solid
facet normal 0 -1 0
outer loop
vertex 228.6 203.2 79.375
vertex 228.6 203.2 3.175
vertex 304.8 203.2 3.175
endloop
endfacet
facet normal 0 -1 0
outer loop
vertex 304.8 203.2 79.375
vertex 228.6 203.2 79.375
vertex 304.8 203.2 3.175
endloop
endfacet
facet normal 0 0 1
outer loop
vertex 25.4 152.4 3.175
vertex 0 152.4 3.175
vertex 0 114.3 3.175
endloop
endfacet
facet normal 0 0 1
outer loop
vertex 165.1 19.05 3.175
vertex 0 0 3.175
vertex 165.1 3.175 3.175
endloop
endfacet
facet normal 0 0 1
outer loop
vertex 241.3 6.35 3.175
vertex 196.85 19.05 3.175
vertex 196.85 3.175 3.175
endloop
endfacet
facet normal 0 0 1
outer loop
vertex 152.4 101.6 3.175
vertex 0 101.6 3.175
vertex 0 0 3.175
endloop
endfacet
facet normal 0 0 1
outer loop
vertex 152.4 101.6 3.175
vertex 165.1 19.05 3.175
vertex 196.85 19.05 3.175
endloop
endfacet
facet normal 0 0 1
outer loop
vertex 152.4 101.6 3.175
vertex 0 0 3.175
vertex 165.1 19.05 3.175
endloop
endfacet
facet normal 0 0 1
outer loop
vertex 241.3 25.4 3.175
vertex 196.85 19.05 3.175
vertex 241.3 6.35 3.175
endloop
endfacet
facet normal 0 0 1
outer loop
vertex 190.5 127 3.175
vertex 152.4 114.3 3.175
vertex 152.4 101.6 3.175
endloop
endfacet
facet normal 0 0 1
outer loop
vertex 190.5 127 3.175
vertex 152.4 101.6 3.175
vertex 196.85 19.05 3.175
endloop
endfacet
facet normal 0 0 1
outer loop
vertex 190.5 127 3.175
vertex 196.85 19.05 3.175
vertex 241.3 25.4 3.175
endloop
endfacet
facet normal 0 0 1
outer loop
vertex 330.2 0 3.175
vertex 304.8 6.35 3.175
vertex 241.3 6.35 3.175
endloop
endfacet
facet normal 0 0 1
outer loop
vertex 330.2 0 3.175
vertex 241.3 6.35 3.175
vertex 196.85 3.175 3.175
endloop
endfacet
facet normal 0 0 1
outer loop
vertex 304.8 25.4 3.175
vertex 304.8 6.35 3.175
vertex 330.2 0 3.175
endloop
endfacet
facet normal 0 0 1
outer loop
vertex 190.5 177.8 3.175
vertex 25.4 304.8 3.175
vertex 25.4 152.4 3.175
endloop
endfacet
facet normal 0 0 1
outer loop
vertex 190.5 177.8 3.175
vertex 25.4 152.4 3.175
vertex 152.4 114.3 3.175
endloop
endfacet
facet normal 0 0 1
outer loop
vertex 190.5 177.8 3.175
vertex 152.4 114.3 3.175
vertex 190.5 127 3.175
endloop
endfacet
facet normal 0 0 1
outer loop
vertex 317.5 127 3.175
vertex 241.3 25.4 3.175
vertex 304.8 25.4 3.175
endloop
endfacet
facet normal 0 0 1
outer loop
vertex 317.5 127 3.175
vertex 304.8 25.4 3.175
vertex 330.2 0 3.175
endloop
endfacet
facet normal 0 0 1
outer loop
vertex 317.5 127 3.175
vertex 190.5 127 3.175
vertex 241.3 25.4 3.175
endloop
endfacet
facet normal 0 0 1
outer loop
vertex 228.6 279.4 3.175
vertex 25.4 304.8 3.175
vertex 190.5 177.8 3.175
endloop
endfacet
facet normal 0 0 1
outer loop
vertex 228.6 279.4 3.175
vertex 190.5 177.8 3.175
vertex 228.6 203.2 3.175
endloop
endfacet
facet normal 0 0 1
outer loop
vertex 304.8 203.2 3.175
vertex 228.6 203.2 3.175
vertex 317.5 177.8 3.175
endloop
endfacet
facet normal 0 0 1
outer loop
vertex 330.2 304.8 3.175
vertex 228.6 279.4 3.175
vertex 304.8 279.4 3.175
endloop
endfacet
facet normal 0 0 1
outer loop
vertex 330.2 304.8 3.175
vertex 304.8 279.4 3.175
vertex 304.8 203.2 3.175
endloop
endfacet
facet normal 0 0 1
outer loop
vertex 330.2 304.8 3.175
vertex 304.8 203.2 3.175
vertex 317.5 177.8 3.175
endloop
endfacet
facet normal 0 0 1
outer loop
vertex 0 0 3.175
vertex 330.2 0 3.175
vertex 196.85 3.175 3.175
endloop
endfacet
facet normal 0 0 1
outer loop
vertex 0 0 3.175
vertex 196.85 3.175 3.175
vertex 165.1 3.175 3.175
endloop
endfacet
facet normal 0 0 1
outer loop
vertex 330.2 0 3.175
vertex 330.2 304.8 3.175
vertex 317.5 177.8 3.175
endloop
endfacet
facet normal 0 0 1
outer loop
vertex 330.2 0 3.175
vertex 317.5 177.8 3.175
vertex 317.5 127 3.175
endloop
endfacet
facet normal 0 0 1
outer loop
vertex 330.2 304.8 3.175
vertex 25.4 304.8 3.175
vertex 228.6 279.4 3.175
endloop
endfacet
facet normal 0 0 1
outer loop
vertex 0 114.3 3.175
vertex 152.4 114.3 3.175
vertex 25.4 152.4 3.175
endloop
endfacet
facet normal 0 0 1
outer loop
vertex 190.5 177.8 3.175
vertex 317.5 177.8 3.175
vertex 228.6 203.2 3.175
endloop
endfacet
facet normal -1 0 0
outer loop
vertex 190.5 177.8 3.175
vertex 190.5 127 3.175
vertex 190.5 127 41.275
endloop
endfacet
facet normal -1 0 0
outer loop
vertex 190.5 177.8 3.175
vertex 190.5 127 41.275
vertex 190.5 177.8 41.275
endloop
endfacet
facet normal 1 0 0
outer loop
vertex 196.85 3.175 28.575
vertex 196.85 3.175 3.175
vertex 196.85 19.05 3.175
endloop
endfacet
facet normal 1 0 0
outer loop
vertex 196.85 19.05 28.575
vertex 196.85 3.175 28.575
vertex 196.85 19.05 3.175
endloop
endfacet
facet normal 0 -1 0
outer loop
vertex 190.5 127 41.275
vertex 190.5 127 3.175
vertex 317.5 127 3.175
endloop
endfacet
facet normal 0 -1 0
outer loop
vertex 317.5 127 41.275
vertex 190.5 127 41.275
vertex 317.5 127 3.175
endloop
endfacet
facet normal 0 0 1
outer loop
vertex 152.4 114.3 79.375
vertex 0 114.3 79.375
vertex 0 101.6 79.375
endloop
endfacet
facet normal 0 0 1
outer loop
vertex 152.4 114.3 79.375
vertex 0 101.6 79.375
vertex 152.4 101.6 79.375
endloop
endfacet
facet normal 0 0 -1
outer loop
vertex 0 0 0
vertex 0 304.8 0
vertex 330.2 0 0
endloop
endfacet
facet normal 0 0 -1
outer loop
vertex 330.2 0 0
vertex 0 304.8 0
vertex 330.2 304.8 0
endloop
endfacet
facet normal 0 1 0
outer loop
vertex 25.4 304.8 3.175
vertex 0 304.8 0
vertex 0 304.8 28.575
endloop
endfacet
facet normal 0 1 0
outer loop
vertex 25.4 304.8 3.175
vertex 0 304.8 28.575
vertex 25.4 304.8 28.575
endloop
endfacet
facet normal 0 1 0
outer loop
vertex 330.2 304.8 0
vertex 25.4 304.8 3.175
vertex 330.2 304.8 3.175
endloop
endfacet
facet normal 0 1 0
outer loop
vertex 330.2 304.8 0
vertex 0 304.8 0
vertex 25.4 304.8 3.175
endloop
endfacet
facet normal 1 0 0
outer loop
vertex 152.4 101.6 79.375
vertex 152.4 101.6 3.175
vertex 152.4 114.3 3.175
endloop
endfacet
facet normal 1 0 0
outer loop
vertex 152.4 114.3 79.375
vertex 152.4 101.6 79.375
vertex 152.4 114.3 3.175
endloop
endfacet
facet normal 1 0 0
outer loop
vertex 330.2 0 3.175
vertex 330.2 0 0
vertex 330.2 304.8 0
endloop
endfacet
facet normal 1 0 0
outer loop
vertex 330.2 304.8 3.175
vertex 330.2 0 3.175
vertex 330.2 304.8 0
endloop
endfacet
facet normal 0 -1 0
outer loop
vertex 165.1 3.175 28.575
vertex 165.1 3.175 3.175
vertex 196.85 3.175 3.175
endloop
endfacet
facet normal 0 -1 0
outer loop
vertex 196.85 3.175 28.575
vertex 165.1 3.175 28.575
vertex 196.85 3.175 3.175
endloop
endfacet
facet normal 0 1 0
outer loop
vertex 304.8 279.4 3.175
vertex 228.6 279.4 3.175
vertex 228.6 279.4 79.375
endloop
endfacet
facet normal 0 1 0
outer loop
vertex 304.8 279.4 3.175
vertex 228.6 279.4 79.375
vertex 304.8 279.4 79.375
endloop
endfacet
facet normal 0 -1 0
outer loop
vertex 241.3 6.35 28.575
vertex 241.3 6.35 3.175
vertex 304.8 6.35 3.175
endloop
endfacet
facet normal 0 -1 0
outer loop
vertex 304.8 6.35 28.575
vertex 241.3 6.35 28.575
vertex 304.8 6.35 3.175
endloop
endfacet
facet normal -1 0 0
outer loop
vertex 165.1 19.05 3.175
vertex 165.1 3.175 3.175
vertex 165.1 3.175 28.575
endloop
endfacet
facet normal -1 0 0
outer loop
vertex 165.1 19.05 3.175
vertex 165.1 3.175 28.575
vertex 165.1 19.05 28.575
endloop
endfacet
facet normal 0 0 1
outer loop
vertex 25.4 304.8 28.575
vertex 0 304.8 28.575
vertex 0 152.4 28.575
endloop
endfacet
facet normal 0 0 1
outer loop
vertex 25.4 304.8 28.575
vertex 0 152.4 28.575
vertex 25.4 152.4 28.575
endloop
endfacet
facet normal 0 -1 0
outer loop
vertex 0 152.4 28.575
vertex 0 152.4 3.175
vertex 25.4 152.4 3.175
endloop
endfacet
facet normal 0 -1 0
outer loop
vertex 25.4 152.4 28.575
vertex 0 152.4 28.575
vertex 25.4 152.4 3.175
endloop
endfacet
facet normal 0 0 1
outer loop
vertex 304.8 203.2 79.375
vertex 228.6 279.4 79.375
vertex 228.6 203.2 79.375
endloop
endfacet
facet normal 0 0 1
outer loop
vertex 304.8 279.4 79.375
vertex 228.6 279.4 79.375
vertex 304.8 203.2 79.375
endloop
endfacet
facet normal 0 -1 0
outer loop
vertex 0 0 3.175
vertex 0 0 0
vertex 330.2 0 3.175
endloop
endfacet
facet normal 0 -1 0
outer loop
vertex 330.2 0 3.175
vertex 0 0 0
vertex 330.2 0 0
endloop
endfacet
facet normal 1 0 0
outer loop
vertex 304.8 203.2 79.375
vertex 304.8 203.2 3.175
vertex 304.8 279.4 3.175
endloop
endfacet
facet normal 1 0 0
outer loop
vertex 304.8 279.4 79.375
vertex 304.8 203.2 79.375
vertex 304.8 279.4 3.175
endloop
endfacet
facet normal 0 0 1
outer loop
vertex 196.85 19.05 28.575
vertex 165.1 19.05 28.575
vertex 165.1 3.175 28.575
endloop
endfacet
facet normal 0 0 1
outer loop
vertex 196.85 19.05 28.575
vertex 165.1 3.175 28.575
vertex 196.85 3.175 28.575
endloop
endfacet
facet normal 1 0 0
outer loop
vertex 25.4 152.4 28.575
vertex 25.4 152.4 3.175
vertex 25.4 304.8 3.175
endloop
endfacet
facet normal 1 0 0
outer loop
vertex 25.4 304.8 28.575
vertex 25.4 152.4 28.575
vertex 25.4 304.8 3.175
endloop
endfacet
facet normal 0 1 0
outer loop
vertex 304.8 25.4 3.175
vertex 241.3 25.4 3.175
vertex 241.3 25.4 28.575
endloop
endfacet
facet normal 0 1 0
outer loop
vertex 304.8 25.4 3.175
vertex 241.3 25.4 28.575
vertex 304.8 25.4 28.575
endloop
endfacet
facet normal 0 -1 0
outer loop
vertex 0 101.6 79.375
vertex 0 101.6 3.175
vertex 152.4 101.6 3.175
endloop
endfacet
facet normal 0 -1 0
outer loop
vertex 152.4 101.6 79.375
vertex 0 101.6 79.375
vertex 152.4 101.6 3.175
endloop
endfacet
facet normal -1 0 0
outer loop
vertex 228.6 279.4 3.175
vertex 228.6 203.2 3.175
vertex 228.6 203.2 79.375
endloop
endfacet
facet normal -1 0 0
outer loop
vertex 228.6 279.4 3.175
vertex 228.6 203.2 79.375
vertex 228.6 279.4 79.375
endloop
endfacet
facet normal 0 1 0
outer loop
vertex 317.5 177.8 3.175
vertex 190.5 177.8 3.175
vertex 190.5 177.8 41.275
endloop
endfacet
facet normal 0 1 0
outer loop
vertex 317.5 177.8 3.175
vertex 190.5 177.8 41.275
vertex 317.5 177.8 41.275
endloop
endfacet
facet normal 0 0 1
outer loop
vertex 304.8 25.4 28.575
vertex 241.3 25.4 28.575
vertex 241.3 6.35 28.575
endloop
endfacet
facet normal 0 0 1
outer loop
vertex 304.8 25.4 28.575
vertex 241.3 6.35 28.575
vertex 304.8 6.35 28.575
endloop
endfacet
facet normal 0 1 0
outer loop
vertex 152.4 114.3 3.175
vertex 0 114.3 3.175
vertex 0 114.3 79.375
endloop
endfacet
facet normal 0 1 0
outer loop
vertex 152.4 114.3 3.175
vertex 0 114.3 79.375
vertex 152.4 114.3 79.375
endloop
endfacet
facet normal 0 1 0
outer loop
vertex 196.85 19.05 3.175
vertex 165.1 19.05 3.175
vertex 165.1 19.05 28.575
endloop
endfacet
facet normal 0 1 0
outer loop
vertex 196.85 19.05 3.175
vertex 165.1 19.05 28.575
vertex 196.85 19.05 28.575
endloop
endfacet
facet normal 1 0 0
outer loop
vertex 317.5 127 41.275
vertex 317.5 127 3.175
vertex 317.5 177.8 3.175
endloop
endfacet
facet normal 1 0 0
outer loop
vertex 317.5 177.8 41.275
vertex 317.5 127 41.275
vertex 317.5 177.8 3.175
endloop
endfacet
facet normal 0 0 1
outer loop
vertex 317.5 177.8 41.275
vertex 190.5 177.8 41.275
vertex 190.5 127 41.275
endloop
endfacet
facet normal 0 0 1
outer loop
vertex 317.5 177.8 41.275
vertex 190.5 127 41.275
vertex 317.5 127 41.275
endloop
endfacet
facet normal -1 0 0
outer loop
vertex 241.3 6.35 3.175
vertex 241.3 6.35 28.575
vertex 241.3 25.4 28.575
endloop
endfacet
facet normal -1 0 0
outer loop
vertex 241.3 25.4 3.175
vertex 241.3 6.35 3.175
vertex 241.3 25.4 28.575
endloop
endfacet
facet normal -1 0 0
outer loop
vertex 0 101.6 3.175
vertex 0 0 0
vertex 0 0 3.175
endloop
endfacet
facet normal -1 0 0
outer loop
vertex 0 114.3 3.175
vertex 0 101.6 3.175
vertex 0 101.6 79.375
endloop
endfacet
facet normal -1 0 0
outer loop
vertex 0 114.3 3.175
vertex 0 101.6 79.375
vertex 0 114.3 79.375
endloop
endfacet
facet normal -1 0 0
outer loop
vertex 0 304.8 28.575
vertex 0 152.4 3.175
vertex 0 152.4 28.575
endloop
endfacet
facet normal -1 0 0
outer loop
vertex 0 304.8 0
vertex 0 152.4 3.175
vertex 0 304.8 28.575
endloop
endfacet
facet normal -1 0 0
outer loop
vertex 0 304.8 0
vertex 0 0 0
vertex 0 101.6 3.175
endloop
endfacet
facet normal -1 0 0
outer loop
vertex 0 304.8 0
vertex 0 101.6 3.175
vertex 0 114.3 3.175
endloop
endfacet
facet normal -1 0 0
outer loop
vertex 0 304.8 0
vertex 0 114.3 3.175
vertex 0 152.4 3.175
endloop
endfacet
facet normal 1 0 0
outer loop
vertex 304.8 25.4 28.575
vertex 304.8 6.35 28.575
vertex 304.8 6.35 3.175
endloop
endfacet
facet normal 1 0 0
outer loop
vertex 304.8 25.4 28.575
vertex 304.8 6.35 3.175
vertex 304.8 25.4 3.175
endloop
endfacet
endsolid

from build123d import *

# Parameters (mm, degrees)
F0_W      = 330.2
F0_H      = 304.8
F1_DEPTH  = 3.175
F2_W      = 76.2
F2_H      = 76.2
F3_DEPTH  = 76.2
F4_W      = 25.4
F4_H      = 152.4
F5_DEPTH  = 25.4
F6_W      = 152.4
F6_H      = 12.7
F7_DEPTH  = 76.2
F8_W      = 127
F8_H      = 50.8
F9_DEPTH  = 38.1
F10_W     = 63.5
F10_H     = 19.05
F11_DEPTH = 25.4
F12_W     = 31.75
F12_H     = 15.875
F13_DEPTH = 25.4


with BuildPart() as f1:
    # F0 (on Top) → F1 (new body)
    with BuildSketch(Plane.XY):
        with Locations((165.1, 152.4)):
            Rectangle(F0_W, F0_H)
    extrude(amount=F1_DEPTH)

    # F2 (on face) → F3 (join)
    with BuildSketch(Plane.XY.offset(3.175)):
        with Locations((266.7, 241.3)):
            Rectangle(F2_W, F2_H)
    extrude(amount=F3_DEPTH)

    # F4 (on face) → F5 (join)
    with BuildSketch(Plane.XY.offset(3.175)):
        with Locations((12.7, 228.6)):
            Rectangle(F4_W, F4_H)
    extrude(amount=F5_DEPTH)

    # F6 (on face) → F7 (join)
    with BuildSketch(Plane.XY.offset(3.175)):
        with Locations((76.2, 107.95)):
            Rectangle(F6_W, F6_H)
    extrude(amount=F7_DEPTH)

    # F8 (on face) → F9 (join)
    with BuildSketch(Plane.XY.offset(3.175)):
        with Locations((254, 152.4)):
            Rectangle(F8_W, F8_H)
    extrude(amount=F9_DEPTH)

    # F10 (on face) → F11 (join)
    with BuildSketch(Plane.XY.offset(3.175)):
        with Locations((273.05, 15.875)):
            Rectangle(F10_W, F10_H)
    extrude(amount=F11_DEPTH)

    # F12 (on face) → F13 (join)
    with BuildSketch(Plane.XY.offset(3.175)):
        with Locations((180.975, 11.1125)):
            Rectangle(F12_W, F12_H)
    extrude(amount=F13_DEPTH)


solid = f1.part
